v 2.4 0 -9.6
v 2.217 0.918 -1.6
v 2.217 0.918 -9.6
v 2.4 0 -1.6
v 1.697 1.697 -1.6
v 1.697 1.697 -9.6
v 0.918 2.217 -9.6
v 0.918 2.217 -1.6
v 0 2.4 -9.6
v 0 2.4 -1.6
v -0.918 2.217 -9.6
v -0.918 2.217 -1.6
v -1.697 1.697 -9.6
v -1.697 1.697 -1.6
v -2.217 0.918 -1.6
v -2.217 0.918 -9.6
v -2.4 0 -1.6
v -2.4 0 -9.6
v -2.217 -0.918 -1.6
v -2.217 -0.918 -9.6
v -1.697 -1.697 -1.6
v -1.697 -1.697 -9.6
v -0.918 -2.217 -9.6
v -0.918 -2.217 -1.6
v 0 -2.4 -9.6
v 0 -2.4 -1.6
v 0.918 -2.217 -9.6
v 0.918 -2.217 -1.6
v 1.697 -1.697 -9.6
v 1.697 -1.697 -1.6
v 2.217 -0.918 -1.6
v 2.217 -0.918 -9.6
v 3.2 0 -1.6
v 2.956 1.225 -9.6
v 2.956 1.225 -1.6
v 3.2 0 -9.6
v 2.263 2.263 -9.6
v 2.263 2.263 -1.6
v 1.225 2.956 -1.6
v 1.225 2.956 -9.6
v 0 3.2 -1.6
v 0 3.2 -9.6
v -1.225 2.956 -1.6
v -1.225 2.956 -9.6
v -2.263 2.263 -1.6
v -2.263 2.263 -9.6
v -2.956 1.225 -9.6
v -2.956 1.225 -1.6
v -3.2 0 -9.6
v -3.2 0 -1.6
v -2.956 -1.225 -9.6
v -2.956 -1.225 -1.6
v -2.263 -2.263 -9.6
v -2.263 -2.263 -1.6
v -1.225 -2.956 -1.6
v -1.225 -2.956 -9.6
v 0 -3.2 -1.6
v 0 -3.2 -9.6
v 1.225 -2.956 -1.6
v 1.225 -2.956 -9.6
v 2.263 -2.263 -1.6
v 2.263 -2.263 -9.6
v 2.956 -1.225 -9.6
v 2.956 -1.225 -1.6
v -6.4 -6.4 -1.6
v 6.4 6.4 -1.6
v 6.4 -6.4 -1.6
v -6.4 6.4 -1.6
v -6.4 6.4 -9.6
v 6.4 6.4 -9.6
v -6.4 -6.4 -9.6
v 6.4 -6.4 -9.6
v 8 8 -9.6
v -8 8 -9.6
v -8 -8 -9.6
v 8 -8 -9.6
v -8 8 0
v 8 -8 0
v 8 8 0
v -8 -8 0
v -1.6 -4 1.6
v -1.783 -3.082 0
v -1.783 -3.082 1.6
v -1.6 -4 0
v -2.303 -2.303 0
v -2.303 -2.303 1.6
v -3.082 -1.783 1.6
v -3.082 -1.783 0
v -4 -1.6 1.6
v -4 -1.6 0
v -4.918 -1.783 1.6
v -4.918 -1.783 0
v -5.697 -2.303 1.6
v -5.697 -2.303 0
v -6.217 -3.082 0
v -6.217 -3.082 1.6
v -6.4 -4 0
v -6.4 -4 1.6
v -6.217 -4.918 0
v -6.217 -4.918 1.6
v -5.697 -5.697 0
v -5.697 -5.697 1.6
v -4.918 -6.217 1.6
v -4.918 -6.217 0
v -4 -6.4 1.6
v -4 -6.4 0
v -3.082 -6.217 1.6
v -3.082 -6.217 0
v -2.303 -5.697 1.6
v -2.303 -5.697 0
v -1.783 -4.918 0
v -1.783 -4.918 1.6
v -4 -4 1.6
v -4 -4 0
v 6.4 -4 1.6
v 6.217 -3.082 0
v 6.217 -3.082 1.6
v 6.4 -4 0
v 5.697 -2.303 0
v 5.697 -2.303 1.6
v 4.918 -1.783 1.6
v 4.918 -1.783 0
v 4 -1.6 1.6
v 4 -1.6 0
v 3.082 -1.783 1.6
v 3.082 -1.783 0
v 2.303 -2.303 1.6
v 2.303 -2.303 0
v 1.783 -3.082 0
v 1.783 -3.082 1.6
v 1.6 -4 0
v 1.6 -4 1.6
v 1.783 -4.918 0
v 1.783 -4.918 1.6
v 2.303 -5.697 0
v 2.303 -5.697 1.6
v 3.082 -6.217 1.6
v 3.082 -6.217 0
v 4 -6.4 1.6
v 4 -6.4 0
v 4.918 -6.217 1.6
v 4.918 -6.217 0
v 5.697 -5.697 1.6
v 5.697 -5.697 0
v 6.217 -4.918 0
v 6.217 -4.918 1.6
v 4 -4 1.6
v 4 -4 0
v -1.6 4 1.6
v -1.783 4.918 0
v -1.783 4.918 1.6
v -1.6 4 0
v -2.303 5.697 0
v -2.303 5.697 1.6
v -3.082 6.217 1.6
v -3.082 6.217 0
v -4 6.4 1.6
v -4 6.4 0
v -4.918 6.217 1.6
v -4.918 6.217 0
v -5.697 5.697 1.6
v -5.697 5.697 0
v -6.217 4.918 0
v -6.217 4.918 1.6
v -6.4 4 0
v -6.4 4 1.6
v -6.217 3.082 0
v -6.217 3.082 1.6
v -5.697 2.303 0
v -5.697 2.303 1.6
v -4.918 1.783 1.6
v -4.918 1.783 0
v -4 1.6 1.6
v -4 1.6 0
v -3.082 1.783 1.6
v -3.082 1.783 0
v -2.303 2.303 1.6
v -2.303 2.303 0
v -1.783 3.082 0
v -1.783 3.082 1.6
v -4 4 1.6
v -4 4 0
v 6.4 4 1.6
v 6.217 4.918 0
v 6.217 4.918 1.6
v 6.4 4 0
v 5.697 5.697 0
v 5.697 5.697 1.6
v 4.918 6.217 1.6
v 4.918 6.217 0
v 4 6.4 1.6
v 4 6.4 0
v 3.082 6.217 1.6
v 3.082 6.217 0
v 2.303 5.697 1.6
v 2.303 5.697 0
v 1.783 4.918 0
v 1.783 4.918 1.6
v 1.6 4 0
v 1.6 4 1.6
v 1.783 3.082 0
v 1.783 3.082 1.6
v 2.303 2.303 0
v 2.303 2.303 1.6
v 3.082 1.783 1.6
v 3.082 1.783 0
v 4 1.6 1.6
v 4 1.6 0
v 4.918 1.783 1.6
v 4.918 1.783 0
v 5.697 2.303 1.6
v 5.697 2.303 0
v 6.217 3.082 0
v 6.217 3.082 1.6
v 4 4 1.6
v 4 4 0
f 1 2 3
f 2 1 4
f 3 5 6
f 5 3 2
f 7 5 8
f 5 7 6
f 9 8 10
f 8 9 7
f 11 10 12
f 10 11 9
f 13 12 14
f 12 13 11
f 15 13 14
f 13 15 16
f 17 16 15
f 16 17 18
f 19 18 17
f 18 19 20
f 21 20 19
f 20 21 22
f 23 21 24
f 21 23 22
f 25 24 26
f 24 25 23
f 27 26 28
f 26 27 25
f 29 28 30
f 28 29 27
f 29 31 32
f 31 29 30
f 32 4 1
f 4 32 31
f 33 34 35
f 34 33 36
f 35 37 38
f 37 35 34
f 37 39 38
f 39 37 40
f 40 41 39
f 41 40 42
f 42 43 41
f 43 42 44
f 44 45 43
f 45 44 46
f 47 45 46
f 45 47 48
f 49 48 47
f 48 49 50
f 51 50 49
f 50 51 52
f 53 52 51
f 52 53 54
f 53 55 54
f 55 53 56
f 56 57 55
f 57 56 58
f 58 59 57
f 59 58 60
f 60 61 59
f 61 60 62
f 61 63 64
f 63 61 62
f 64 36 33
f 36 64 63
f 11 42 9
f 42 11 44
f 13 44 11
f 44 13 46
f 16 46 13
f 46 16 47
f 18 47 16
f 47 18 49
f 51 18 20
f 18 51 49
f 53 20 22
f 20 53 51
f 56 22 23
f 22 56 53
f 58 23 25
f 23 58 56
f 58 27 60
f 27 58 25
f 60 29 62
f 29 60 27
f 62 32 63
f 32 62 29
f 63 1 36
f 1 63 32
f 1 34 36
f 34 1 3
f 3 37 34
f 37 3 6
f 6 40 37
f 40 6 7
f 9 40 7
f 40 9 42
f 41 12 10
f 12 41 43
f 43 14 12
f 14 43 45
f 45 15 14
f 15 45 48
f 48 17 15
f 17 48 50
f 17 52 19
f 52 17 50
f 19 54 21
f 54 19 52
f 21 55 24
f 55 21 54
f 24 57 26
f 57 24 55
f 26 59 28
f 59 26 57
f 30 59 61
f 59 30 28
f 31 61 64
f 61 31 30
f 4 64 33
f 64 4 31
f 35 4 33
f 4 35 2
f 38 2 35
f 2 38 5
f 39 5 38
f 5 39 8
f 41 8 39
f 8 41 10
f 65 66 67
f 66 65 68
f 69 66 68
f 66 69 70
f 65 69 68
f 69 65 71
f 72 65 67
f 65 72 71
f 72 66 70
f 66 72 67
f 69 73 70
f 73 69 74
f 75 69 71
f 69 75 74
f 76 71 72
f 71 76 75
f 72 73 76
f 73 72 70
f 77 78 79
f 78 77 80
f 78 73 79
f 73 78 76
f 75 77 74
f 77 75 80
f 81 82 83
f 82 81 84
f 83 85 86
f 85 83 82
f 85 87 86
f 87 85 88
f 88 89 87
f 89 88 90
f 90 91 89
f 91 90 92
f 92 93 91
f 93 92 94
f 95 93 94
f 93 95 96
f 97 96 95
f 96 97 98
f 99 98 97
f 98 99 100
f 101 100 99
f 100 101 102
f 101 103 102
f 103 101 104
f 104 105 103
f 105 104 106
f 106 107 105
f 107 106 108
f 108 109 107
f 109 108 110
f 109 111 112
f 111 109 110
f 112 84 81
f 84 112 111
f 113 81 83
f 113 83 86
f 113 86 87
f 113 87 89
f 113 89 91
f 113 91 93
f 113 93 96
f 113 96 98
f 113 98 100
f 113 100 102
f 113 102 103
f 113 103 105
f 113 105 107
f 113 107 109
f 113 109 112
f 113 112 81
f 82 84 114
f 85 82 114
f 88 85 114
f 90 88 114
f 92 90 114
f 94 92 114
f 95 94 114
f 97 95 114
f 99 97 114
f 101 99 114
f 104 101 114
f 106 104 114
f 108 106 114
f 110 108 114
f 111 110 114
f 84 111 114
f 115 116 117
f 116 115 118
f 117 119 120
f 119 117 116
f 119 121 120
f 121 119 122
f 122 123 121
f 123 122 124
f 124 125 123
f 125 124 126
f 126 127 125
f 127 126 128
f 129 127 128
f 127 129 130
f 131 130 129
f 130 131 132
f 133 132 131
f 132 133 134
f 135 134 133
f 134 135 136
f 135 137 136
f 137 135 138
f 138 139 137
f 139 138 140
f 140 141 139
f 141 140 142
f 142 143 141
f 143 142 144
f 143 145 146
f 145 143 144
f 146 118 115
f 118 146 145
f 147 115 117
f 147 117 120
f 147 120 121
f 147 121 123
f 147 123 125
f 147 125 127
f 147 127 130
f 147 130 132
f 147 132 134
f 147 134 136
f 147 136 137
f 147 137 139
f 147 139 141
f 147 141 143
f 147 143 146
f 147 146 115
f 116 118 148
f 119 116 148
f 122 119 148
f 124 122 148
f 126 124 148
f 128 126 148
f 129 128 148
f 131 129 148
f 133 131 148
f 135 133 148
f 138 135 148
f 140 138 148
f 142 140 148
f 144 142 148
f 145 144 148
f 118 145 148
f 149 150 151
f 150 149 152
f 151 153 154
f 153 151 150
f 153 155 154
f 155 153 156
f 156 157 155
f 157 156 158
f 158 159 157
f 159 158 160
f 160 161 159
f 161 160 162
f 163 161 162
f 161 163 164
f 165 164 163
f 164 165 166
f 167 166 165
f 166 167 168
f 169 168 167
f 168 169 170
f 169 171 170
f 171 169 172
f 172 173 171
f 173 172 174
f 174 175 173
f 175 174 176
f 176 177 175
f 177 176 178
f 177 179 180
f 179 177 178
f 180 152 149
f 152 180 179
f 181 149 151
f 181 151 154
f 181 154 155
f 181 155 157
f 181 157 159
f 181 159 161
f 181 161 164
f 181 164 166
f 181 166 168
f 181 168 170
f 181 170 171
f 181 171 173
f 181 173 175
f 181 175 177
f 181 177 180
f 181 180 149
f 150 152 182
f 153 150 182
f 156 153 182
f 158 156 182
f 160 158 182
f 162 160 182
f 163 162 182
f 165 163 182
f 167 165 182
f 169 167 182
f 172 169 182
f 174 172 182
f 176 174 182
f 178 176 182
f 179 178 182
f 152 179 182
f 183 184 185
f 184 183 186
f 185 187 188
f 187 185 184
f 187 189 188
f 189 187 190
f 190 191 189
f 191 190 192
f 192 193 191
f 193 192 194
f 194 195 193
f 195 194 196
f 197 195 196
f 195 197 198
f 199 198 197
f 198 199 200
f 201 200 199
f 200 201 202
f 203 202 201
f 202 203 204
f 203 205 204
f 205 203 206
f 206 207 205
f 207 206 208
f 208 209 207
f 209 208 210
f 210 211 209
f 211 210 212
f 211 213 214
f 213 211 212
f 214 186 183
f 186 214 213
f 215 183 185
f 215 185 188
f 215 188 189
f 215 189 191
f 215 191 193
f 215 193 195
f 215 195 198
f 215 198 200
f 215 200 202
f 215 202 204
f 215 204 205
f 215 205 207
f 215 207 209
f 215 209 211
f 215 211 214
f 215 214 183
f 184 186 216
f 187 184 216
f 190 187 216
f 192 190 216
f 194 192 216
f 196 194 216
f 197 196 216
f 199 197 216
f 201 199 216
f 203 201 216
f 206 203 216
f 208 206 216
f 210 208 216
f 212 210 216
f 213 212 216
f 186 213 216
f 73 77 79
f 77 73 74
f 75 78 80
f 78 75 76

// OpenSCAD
// file: ../p/4-4disc.scad
use <../lib.scad>
function ldraw_lib__4_4disc() = [
// 0 Disc 1.0
// 0 Name: 4-4disc.dat
// 0 Author: James Jessiman
// 0 !LDRAW_ORG Primitive UPDATE 2002-02
// 0 !LICENSE Licensed under CC BY 2.0 and CC BY 4.0 : see CAreadme.txt
// 
// 0 BFC CERTIFY CCW
  [0,"BFC","CERTIFY"],
  [0,"BFC","CCW"],
// 
// 0 !HISTORY 1998-12-15 [PTadmin] Official Update 1998-10
// 0 !HISTORY 2002-03-23 [sbliss] Added BFC statement
// 0 !HISTORY 2002-04-25 [PTadmin] Official Update 2002-02
// 0 !HISTORY 2007-06-24 [PTadmin] Header formatted for Contributor Agreement
// 0 !HISTORY 2008-07-01 [PTadmin] Official Update 2008-01
// 
// 
// 3 16 0 0 0 1 0 0 0.9239 0 0.3827
  [3,16,0,0,0,1,0,0,0.9239,0,0.3827],
// 3 16 0 0 0 0.9239 0 0.3827 0.7071 0 0.7071
  [3,16,0,0,0,0.9239,0,0.3827,0.7071,0,0.7071],
// 3 16 0 0 0 0.7071 0 0.7071 0.3827 0 0.9239
  [3,16,0,0,0,0.7071,0,0.7071,0.3827,0,0.9239],
// 3 16 0 0 0 0.3827 0 0.9239 0 0 1
  [3,16,0,0,0,0.3827,0,0.9239,0,0,1],
// 3 16 0 0 0 0 0 1 -0.3827 0 0.9239
  [3,16,0,0,0,0,0,1,-0.3827,0,0.9239],
// 3 16 0 0 0 -0.3827 0 0.9239 -0.7071 0 0.7071
  [3,16,0,0,0,-0.3827,0,0.9239,-0.7071,0,0.7071],
// 3 16 0 0 0 -0.7071 0 0.7071 -0.9239 0 0.3827
  [3,16,0,0,0,-0.7071,0,0.7071,-0.9239,0,0.3827],
// 3 16 0 0 0 -0.9239 0 0.3827 -1 0 -0
  [3,16,0,0,0,-0.9239,0,0.3827,-1,0,-0],
// 3 16 0 0 0 -1 0 -0 -0.9239 0 -0.3827
  [3,16,0,0,0,-1,0,-0,-0.9239,0,-0.3827],
// 3 16 0 0 0 -0.9239 0 -0.3827 -0.7071 0 -0.7071
  [3,16,0,0,0,-0.9239,0,-0.3827,-0.7071,0,-0.7071],
// 3 16 0 0 0 -0.7071 0 -0.7071 -0.3827 0 -0.9239
  [3,16,0,0,0,-0.7071,0,-0.7071,-0.3827,0,-0.9239],
// 3 16 0 0 0 -0.3827 0 -0.9239 0 0 -1
  [3,16,0,0,0,-0.3827,0,-0.9239,0,0,-1],
// 3 16 0 0 0 0 0 -1 0.3827 0 -0.9239
  [3,16,0,0,0,0,0,-1,0.3827,0,-0.9239],
// 3 16 0 0 0 0.3827 0 -0.9239 0.7071 0 -0.7071
  [3,16,0,0,0,0.3827,0,-0.9239,0.7071,0,-0.7071],
// 3 16 0 0 0 0.7071 0 -0.7071 0.9239 0 -0.3827
  [3,16,0,0,0,0.7071,0,-0.7071,0.9239,0,-0.3827],
// 3 16 0 0 0 0.9239 0 -0.3827 1 0 0
  [3,16,0,0,0,0.9239,0,-0.3827,1,0,0],
// 0
];
module ldraw_lib__4_4disc(step=0, col=false, unit=2/5, alt=false, line=0.2, solid=!$preview)
    makepoly(ldraw_lib__4_4disc(), step=step, col=col, unit=unit, alt=alt, line=line, solid=solid);
ldraw_lib__4_4disc(line=0.2);
// file: ../p/stud.scad
use <../lib.scad>
use <4-4cyli.scad>
use <4-4disc.scad>
use <4-4edge.scad>
function ldraw_lib__stud() = [
// 0 Stud
// 0 Name: stud.dat
// 0 Author: James Jessiman
// 0 !LDRAW_ORG Primitive UPDATE 2012-01
// 0 !LICENSE Licensed under CC BY 4.0 : see CAreadme.txt
// 
// 0 BFC CERTIFY CCW
  [0,"BFC","CERTIFY"],
  [0,"BFC","CCW"],
// 
// 0 !HISTORY 2002-04-04 [sbliss] Modified for BFC compliance
// 0 !HISTORY 2002-04-25 [PTadmin] Official Update 2002-02
// 0 !HISTORY 2007-06-24 [PTadmin] Header formatted for Contributor Agreement
// 0 !HISTORY 2008-07-01 [PTadmin] Official Update 2008-01
// 0 !HISTORY 2012-02-16 [Philo] Changed to CCW
// 0 !HISTORY 2012-03-30 [PTadmin] Official Update 2012-01
// 
// 
// 1 16 0 0 0 6 0 0 0 1 0 0 0 6 4-4edge.dat
  [1,16,0,0,0,6,0,0,0,1,0,0,0,6, ldraw_lib__4_4edge()],
// 1 16 0 -4 0 6 0 0 0 1 0 0 0 6 4-4edge.dat
  [1,16,0,-4,0,6,0,0,0,1,0,0,0,6, ldraw_lib__4_4edge()],
// 1 16 0 0 0 6 0 0 0 -4 0 0 0 6 4-4cyli.dat
  [1,16,0,0,0,6,0,0,0,-4,0,0,0,6, ldraw_lib__4_4cyli()],
// 1 16 0 -4 0 6 0 0 0 1 0 0 0 6 4-4disc.dat
  [1,16,0,-4,0,6,0,0,0,1,0,0,0,6, ldraw_lib__4_4disc()],
  [-1,16,0,0,0,6,0,0,0,-1,0,0,0,6, ldraw_lib__4_4disc()],
];
module ldraw_lib__stud(step=0, col=false, unit=2/5, alt=false, line=0.2, solid=!$preview)
    makepoly(ldraw_lib__stud(), step=step, col=col, unit=unit, alt=alt, line=line, solid=solid);
ldraw_lib__stud(line=0.2);
// file: ../p/4-4ring3.scad
use <../lib.scad>
$fa=1; $fs=0.2;
function ldraw_lib__4_4ring3(realsolid=false) = [
// 0 Ring  3 x 1.0
// 0 Name: 4-4ring3.dat
// 0 Author: James Jessiman
// 0 !LDRAW_ORG Primitive UPDATE 2009-01
// 0 !LICENSE Licensed under CC BY 2.0 and CC BY 4.0 : see CAreadme.txt
// 
// 0 BFC CERTIFY CCW
  [0,"BFC","CERTIFY"],
  [0,"BFC","CCW"],
// 
// 0 !HISTORY 1998-12-15 [PTadmin] Official Update 1998-10
// 0 !HISTORY 2002-04-05 [hafhead] Added BFC statement
// 0 !HISTORY 2002-04-25 [PTadmin] Official Update 2002-02
// 0 !HISTORY 2007-06-24 [PTadmin] Header formatted for Contributor Agreement
// 0 !HISTORY 2008-07-01 [PTadmin] Official Update 2008-01
// 0 !HISTORY 2008-08-26 [cwdee] Switch polygon winding and rename
// 0 !HISTORY 2009-05-02 [PTadmin] Official Update 2009-01
// 
// 
// 4 16 -1.5308 0 3.6956 -1.1481 0 2.7717 0 0 3 0 0 4
  [4,16,-1.5308,0,3.6956,-1.1481,0,2.7717,0,0,3,0,0,4],
// 4 16 -2.8284 0 2.8284 -2.1213 0 2.1213 -1.1481 0 2.7717 -1.5308 0 3.6956
  [4,16,-2.8284,0,2.8284,-2.1213,0,2.1213,-1.1481,0,2.7717,-1.5308,0,3.6956],
// 4 16 -3.6956 0 1.5308 -2.7717 0 1.1481 -2.1213 0 2.1213 -2.8284 0 2.8284
  [4,16,-3.6956,0,1.5308,-2.7717,0,1.1481,-2.1213,0,2.1213,-2.8284,0,2.8284],
// 4 16 -4 0 0 -3 0 0 -2.7717 0 1.1481 -3.6956 0 1.5308
  [4,16,-4,0,0,-3,0,0,-2.7717,0,1.1481,-3.6956,0,1.5308],
// 4 16 -3.6956 0 -1.5308 -2.7717 0 -1.1481 -3 0 0 -4 0 0
  [4,16,-3.6956,0,-1.5308,-2.7717,0,-1.1481,-3,0,0,-4,0,0],
// 4 16 -2.8284 0 -2.8284 -2.1213 0 -2.1213 -2.7717 0 -1.1481 -3.6956 0 -1.5308
  [4,16,-2.8284,0,-2.8284,-2.1213,0,-2.1213,-2.7717,0,-1.1481,-3.6956,0,-1.5308],
// 4 16 -1.5308 0 -3.6956 -1.1481 0 -2.7717 -2.1213 0 -2.1213 -2.8284 0 -2.8284
  [4,16,-1.5308,0,-3.6956,-1.1481,0,-2.7717,-2.1213,0,-2.1213,-2.8284,0,-2.8284],
// 4 16 0 0 -4 0 0 -3 -1.1481 0 -2.7717 -1.5308 0 -3.6956
  [4,16,0,0,-4,0,0,-3,-1.1481,0,-2.7717,-1.5308,0,-3.6956],
// 4 16 1.5308 0 -3.6956 1.1481 0 -2.7717 0 0 -3 0 0 -4
  [4,16,1.5308,0,-3.6956,1.1481,0,-2.7717,0,0,-3,0,0,-4],
// 4 16 2.8284 0 -2.8284 2.1213 0 -2.1213 1.1481 0 -2.7717 1.5308 0 -3.6956
  [4,16,2.8284,0,-2.8284,2.1213,0,-2.1213,1.1481,0,-2.7717,1.5308,0,-3.6956],
// 4 16 3.6956 0 -1.5308 2.7717 0 -1.1481 2.1213 0 -2.1213 2.8284 0 -2.8284
  [4,16,3.6956,0,-1.5308,2.7717,0,-1.1481,2.1213,0,-2.1213,2.8284,0,-2.8284],
// 4 16 4 0 0 3 0 0 2.7717 0 -1.1481 3.6956 0 -1.5308
  [4,16,4,0,0,3,0,0,2.7717,0,-1.1481,3.6956,0,-1.5308],
// 4 16 3.6956 0 1.5308 2.7717 0 1.1481 3 0 0 4 0 0
  [4,16,3.6956,0,1.5308,2.7717,0,1.1481,3,0,0,4,0,0],
// 4 16 2.8284 0 2.8284 2.1213 0 2.1213 2.7717 0 1.1481 3.6956 0 1.5308
  [4,16,2.8284,0,2.8284,2.1213,0,2.1213,2.7717,0,1.1481,3.6956,0,1.5308],
// 4 16 1.5308 0 3.6956 1.1481 0 2.7717 2.1213 0 2.1213 2.8284 0 2.8284
  [4,16,1.5308,0,3.6956,1.1481,0,2.7717,2.1213,0,2.1213,2.8284,0,2.8284],
// 4 16 0 0 4 0 0 3 1.1481 0 2.7717 1.5308 0 3.6956
  [4,16,0,0,4,0,0,3,1.1481,0,2.7717,1.5308,0,3.6956],
// 0
];
module ldraw_lib__4_4ring3(step=0, col=false, unit=2/5, alt=false, line=0.2, solid=!$preview)
    makepoly(ldraw_lib__4_4ring3(solid), step=step, col=col, unit=unit, alt=alt, line=line, solid=solid);
ldraw_lib__4_4ring3(line=0.2);
// file: ../p/4-4edge.scad
use <../lib.scad>
function ldraw_lib__4_4edge() = [
// 0 Circle 1.0
// 0 Name: 4-4edge.dat
// 0 Author: James Jessiman
// 0 !LDRAW_ORG Primitive UPDATE 2017-01
// 0 !LICENSE Licensed under CC BY 2.0 and CC BY 4.0 : see CAreadme.txt
// 
// 0 BFC CERTIFY CCW
  [0,"BFC","CERTIFY"],
  [0,"BFC","CCW"],
// 
// 0 !HISTORY 1998-12-15 [PTadmin] Official Update 1998-10
// 0 !HISTORY 2005-12-28 [PTadmin] Official Update 2005-01
// 0 !HISTORY 2007-06-24 [PTadmin] Header formatted for Contributor Agreement
// 0 !HISTORY 2008-07-01 [PTadmin] Official Update 2008-01
// 0 !HISTORY 2017-01-15 [Steffen] BFCed
// 0 !HISTORY 2017-12-30 [PTadmin] Official Update 2017-01
// 
// 
// 2 24 1 0 0 0.9239 0 0.3827
  [2,24,1,0,0,0.9239,0,0.3827],
// 2 24 0.9239 0 0.3827 0.7071 0 0.7071
  [2,24,0.9239,0,0.3827,0.7071,0,0.7071],
// 2 24 0.7071 0 0.7071 0.3827 0 0.9239
  [2,24,0.7071,0,0.7071,0.3827,0,0.9239],
// 2 24 0.3827 0 0.9239 0 0 1
  [2,24,0.3827,0,0.9239,0,0,1],
// 2 24 0 0 1 -0.3827 0 0.9239
  [2,24,0,0,1,-0.3827,0,0.9239],
// 2 24 -0.3827 0 0.9239 -0.7071 0 0.7071
  [2,24,-0.3827,0,0.9239,-0.7071,0,0.7071],
// 2 24 -0.7071 0 0.7071 -0.9239 0 0.3827
  [2,24,-0.7071,0,0.7071,-0.9239,0,0.3827],
// 2 24 -0.9239 0 0.3827 -1 0 -0
  [2,24,-0.9239,0,0.3827,-1,0,-0],
// 2 24 -1 0 -0 -0.9239 0 -0.3827
  [2,24,-1,0,-0,-0.9239,0,-0.3827],
// 2 24 -0.9239 0 -0.3827 -0.7071 0 -0.7071
  [2,24,-0.9239,0,-0.3827,-0.7071,0,-0.7071],
// 2 24 -0.7071 0 -0.7071 -0.3827 0 -0.9239
  [2,24,-0.7071,0,-0.7071,-0.3827,0,-0.9239],
// 2 24 -0.3827 0 -0.9239 0 0 -1
  [2,24,-0.3827,0,-0.9239,0,0,-1],
// 2 24 0 0 -1 0.3827 0 -0.9239
  [2,24,0,0,-1,0.3827,0,-0.9239],
// 2 24 0.3827 0 -0.9239 0.7071 0 -0.7071
  [2,24,0.3827,0,-0.9239,0.7071,0,-0.7071],
// 2 24 0.7071 0 -0.7071 0.9239 0 -0.3827
  [2,24,0.7071,0,-0.7071,0.9239,0,-0.3827],
// 2 24 0.9239 0 -0.3827 1 0 0
  [2,24,0.9239,0,-0.3827,1,0,0],
];
module ldraw_lib__4_4edge(step=0, col=false, unit=2/5, alt=false, line=0.2, solid=!$preview)
    makepoly(ldraw_lib__4_4edge(), step=step, col=col, unit=unit, alt=alt, line=line, solid=solid);
ldraw_lib__4_4edge(line=0.2);
// file: ../p/4-4cyli.scad
use <../lib.scad>
$fa=1; $fs=0.2;
function ldraw_lib__4_4cyli(realsolid=false) = [
// 0 Cylinder 1.0
// 0 Name: 4-4cyli.dat
// 0 Author: James Jessiman
// 0 !LDRAW_ORG Primitive UPDATE 2005-01
// 0 !LICENSE Licensed under CC BY 2.0 and CC BY 4.0 : see CAreadme.txt
// 
// 0 BFC CERTIFY CCW
  [0,"BFC","CERTIFY"],
  [0,"BFC","CCW"],
// 
// 0 !HISTORY 1998-12-15 [PTadmin] Official Update 1998-10
// 0 !HISTORY 2002-03-23 [sbliss] Added BFC statement; merged headers from files in distributions LDraw 0.27 and Complete.
// 0 !HISTORY 2002-04-25 [PTadmin] Official Update 2002-02
// 0 !HISTORY 2004-12-14 [guyvivan] BFC CCW
// 0 !HISTORY 2005-12-28 [PTadmin] Official Update 2005-01
// 0 !HISTORY 2007-06-24 [PTadmin] Header formatted for Contributor Agreement
// 0 !HISTORY 2008-07-01 [PTadmin] Official Update 2008-01
// 
// 
// 4 16 1 1 0 0.9239 1 0.3827 0.9239 0 0.3827 1 0 0
  [4,16,1,1,0,0.9239,1,0.3827,0.9239,0,0.3827,1,0,0],
// 5 24 1 0 0 1 1 0 0.9239 0 0.3827 0.9239 0 -0.3827
  [5,24,1,0,0,1,1,0,0.9239,0,0.3827,0.9239,0,-0.3827],
// 4 16 0.9239 1 0.3827 0.7071 1 0.7071 0.7071 0 0.7071 0.9239 0 0.3827
  [4,16,0.9239,1,0.3827,0.7071,1,0.7071,0.7071,0,0.7071,0.9239,0,0.3827],
// 5 24 0.9239 0 0.3827 0.9239 1 0.3827 0.7071 0 0.7071 1 0 0
  [5,24,0.9239,0,0.3827,0.9239,1,0.3827,0.7071,0,0.7071,1,0,0],
// 4 16 0.7071 1 0.7071 0.3827 1 0.9239 0.3827 0 0.9239 0.7071 0 0.7071
  [4,16,0.7071,1,0.7071,0.3827,1,0.9239,0.3827,0,0.9239,0.7071,0,0.7071],
// 5 24 0.7071 0 0.7071 0.7071 1 0.7071 0.3827 0 0.9239 0.9239 0 0.3827
  [5,24,0.7071,0,0.7071,0.7071,1,0.7071,0.3827,0,0.9239,0.9239,0,0.3827],
// 4 16 0.3827 1 0.9239 0 1 1 0 0 1 0.3827 0 0.9239
  [4,16,0.3827,1,0.9239,0,1,1,0,0,1,0.3827,0,0.9239],
// 5 24 0.3827 0 0.9239 0.3827 1 0.9239 0 0 1 0.7071 0 0.7071
  [5,24,0.3827,0,0.9239,0.3827,1,0.9239,0,0,1,0.7071,0,0.7071],
// 4 16 0 1 1 -0.3827 1 0.9239 -0.3827 0 0.9239 0 0 1
  [4,16,0,1,1,-0.3827,1,0.9239,-0.3827,0,0.9239,0,0,1],
// 5 24 0 0 1 0 1 1 -0.3827 0 0.9239 0.3827 0 0.9239
  [5,24,0,0,1,0,1,1,-0.3827,0,0.9239,0.3827,0,0.9239],
// 4 16 -0.3827 1 0.9239 -0.7071 1 0.7071 -0.7071 0 0.7071 -0.3827 0 0.9239
  [4,16,-0.3827,1,0.9239,-0.7071,1,0.7071,-0.7071,0,0.7071,-0.3827,0,0.9239],
// 5 24 -0.3827 0 0.9239 -0.3827 1 0.9239 -0.7071 0 0.7071 0 0 1
  [5,24,-0.3827,0,0.9239,-0.3827,1,0.9239,-0.7071,0,0.7071,0,0,1],
// 4 16 -0.7071 1 0.7071 -0.9239 1 0.3827 -0.9239 0 0.3827 -0.7071 0 0.7071
  [4,16,-0.7071,1,0.7071,-0.9239,1,0.3827,-0.9239,0,0.3827,-0.7071,0,0.7071],
// 5 24 -0.7071 0 0.7071 -0.7071 1 0.7071 -0.9239 0 0.3827 -0.3827 0 0.9239
  [5,24,-0.7071,0,0.7071,-0.7071,1,0.7071,-0.9239,0,0.3827,-0.3827,0,0.9239],
// 4 16 -0.9239 1 0.3827 -1 1 0 -1 0 0 -0.9239 0 0.3827
  [4,16,-0.9239,1,0.3827,-1,1,0,-1,0,0,-0.9239,0,0.3827],
// 5 24 -0.9239 0 0.3827 -0.9239 1 0.3827 -1 0 0 -0.7071 0 0.7071
  [5,24,-0.9239,0,0.3827,-0.9239,1,0.3827,-1,0,0,-0.7071,0,0.7071],
// 4 16 -1 1 0 -0.9239 1 -0.3827 -0.9239 0 -0.3827 -1 0 0
  [4,16,-1,1,0,-0.9239,1,-0.3827,-0.9239,0,-0.3827,-1,0,0],
// 5 24 -1 0 0 -1 1 0 -0.9239 0 -0.3827 -0.9239 0 0.3827
  [5,24,-1,0,0,-1,1,0,-0.9239,0,-0.3827,-0.9239,0,0.3827],
// 4 16 -0.9239 1 -0.3827 -0.7071 1 -0.7071 -0.7071 0 -0.7071 -0.9239 0 -0.3827
  [4,16,-0.9239,1,-0.3827,-0.7071,1,-0.7071,-0.7071,0,-0.7071,-0.9239,0,-0.3827],
// 5 24 -0.9239 0 -0.3827 -0.9239 1 -0.3827 -0.7071 0 -0.7071 -1 0 0
  [5,24,-0.9239,0,-0.3827,-0.9239,1,-0.3827,-0.7071,0,-0.7071,-1,0,0],
// 4 16 -0.7071 1 -0.7071 -0.3827 1 -0.9239 -0.3827 0 -0.9239 -0.7071 0 -0.7071
  [4,16,-0.7071,1,-0.7071,-0.3827,1,-0.9239,-0.3827,0,-0.9239,-0.7071,0,-0.7071],
// 5 24 -0.7071 0 -0.7071 -0.7071 1 -0.7071 -0.3827 0 -0.9239 -0.9239 0 -0.3827
  [5,24,-0.7071,0,-0.7071,-0.7071,1,-0.7071,-0.3827,0,-0.9239,-0.9239,0,-0.3827],
// 4 16 -0.3827 1 -0.9239 0 1 -1 0 0 -1 -0.3827 0 -0.9239
  [4,16,-0.3827,1,-0.9239,0,1,-1,0,0,-1,-0.3827,0,-0.9239],
// 5 24 -0.3827 0 -0.9239 -0.3827 1 -0.9239 0 0 -1 -0.7071 0 -0.7071
  [5,24,-0.3827,0,-0.9239,-0.3827,1,-0.9239,0,0,-1,-0.7071,0,-0.7071],
// 4 16 0 1 -1 0.3827 1 -0.9239 0.3827 0 -0.9239 0 0 -1
  [4,16,0,1,-1,0.3827,1,-0.9239,0.3827,0,-0.9239,0,0,-1],
// 5 24 0 0 -1 0 1 -1 0.3827 0 -0.9239 -0.3827 0 -0.9239
  [5,24,0,0,-1,0,1,-1,0.3827,0,-0.9239,-0.3827,0,-0.9239],
// 4 16 0.3827 1 -0.9239 0.7071 1 -0.7071 0.7071 0 -0.7071 0.3827 0 -0.9239
  [4,16,0.3827,1,-0.9239,0.7071,1,-0.7071,0.7071,0,-0.7071,0.3827,0,-0.9239],
// 5 24 0.3827 0 -0.9239 0.3827 1 -0.9239 0.7071 0 -0.7071 0 0 -1
  [5,24,0.3827,0,-0.9239,0.3827,1,-0.9239,0.7071,0,-0.7071,0,0,-1],
// 4 16 0.7071 1 -0.7071 0.9239 1 -0.3827 0.9239 0 -0.3827 0.7071 0 -0.7071
  [4,16,0.7071,1,-0.7071,0.9239,1,-0.3827,0.9239,0,-0.3827,0.7071,0,-0.7071],
// 5 24 0.7071 0 -0.7071 0.7071 1 -0.7071 0.9239 0 -0.3827 0.3827 0 -0.9239
  [5,24,0.7071,0,-0.7071,0.7071,1,-0.7071,0.9239,0,-0.3827,0.3827,0,-0.9239],
// 4 16 0.9239 1 -0.3827 1 1 0 1 0 0 0.9239 0 -0.3827
  [4,16,0.9239,1,-0.3827,1,1,0,1,0,0,0.9239,0,-0.3827],
// 5 24 0.9239 0 -0.3827 0.9239 1 -0.3827 1 0 0 0.7071 0 -0.7071
  [5,24,0.9239,0,-0.3827,0.9239,1,-0.3827,1,0,0,0.7071,0,-0.7071],
// 0
];
module ldraw_lib__4_4cyli(step=0, col=false, unit=2/5, alt=false, line=0.2, solid=!$preview)
    makepoly(ldraw_lib__4_4cyli(solid), step=step, col=col, unit=unit, alt=alt, line=line, solid=solid);
ldraw_lib__4_4cyli(line=0.2);
// file: ../p/stug-2x2.scad
use <../lib.scad>
use <stud.scad>
function ldraw_lib__stug_2x2() = [
// 0 Stud Group  2 x  2
// 0 Name: stug-2x2.dat
// 0 Author: Steffen [Steffen]
// 0 !LDRAW_ORG Primitive UPDATE 2012-01
// 0 !LICENSE Licensed under CC BY 2.0 and CC BY 4.0 : see CAreadme.txt
// 
// 0 BFC CERTIFY CCW
  [0,"BFC","CERTIFY"],
  [0,"BFC","CCW"],
// 
// 0 !HISTORY 2005-12-28 [PTadmin] Official Update 2005-01
// 0 !HISTORY 2007-05-04 [PTadmin] Header formatted for Contributor Agreement
// 0 !HISTORY 2008-07-01 [PTadmin] Official Update 2008-01
// 0 !HISTORY 2011-07-01 [PTadmin] Renamed from stug2
// 0 !HISTORY 2011-07-25 [PTadmin] Official Update 2011-01
// 0 !HISTORY 2012-02-16 [Philo] Changed to CCW
// 0 !HISTORY 2012-03-30 [PTadmin] Official Update 2012-01
// 
// 
// 1 16 -10 0 -10 1 0 0 0 1 0 0 0 1 stud.dat
  [1,16,-10,0,-10,1,0,0,0,1,0,0,0,1, ldraw_lib__stud()],
// 1 16 10 0 -10 1 0 0 0 1 0 0 0 1 stud.dat
  [1,16,10,0,-10,1,0,0,0,1,0,0,0,1, ldraw_lib__stud()],
// 1 16 -10 0 10 1 0 0 0 1 0 0 0 1 stud.dat
  [1,16,-10,0,10,1,0,0,0,1,0,0,0,1, ldraw_lib__stud()],
// 1 16 10 0 10 1 0 0 0 1 0 0 0 1 stud.dat
  [1,16,10,0,10,1,0,0,0,1,0,0,0,1, ldraw_lib__stud()],
];
module ldraw_lib__stug_2x2(step=0, col=false, unit=2/5, alt=false, line=0.2, solid=!$preview)
    makepoly(ldraw_lib__stug_2x2(), step=step, col=col, unit=unit, alt=alt, line=line, solid=solid);
ldraw_lib__stug_2x2(line=0.2);
// file: ../p/stud4.scad
use <../lib.scad>
use <4-4cyli.scad>
use <4-4edge.scad>
use <4-4ring3.scad>
function ldraw_lib__stud4() = [
// 0 Stud Tube Open
// 0 Name: stud4.dat
// 0 Author: James Jessiman
// 0 !LDRAW_ORG Primitive UPDATE 2009-02
// 0 !LICENSE Licensed under CC BY 4.0 : see CAreadme.txt
// 
// 0 BFC CERTIFY CCW
  [0,"BFC","CERTIFY"],
  [0,"BFC","CCW"],
// 
// 0 !HISTORY 1999-07-05 [PTadmin] Official Update 1999-05
// 0 !HISTORY 2002-04-04 [sbliss] Modified for BFC compliance
// 0 !HISTORY 2002-04-25 [PTadmin] Official Update 2002-02
// 0 !HISTORY 2007-06-24 [PTadmin] Header formatted for Contributor Agreement
// 0 !HISTORY 2008-07-01 [PTadmin] Official Update 2008-01
// 0 !HISTORY 2009-06-21 [cwdee] Update ring references to 4-4ring
// 0 !HISTORY 2009-09-03 [PTadmin] Official Update 2009-02
// 
// 
// 1 16 0 -4 0 6 0 0 0 1 0 0 0 6 4-4edge.dat
  [1,16,0,-4,0,6,0,0,0,1,0,0,0,6, ldraw_lib__4_4edge()],
// 1 16 0 -4 0 8 0 0 0 1 0 0 0 8 4-4edge.dat
  [1,16,0,-4,0,8,0,0,0,1,0,0,0,8, ldraw_lib__4_4edge()],
// 1 16 0 0 0 6 0 0 0 1 0 0 0 6 4-4edge.dat
  [1,16,0,0,0,6,0,0,0,1,0,0,0,6, ldraw_lib__4_4edge()],
// 1 16 0 0 0 8 0 0 0 1 0 0 0 8 4-4edge.dat
  [1,16,0,0,0,8,0,0,0,1,0,0,0,8, ldraw_lib__4_4edge()],
// 0 BFC INVERTNEXT
  [0,"BFC","INVERTNEXT"],
// 1 16 0 -4 0 6 0 0 0 4 0 0 0 6 4-4cyli.dat
  [1,16,0,-4,0,6,0,0,0,4,0,0,0,6, ldraw_lib__4_4cyli()],
// 1 16 0 -4 0 8 0 0 0 4 0 0 0 8 4-4cyli.dat
  [1,16,0,-4,0,8,0,0,0,4,0,0,0,8, ldraw_lib__4_4cyli()],
// 1 16 0 -4 0 2 0 0 0 1 0 0 0 2 4-4ring3.dat
  [1,16,0,-4,0,2,0,0,0,1,0,0,0,2, ldraw_lib__4_4ring3()],
  [-1,16,0,0,0,2,0,0,0,-1,0,0,0,2, ldraw_lib__4_4ring3()],
// 0
];
module ldraw_lib__stud4(step=0, col=false, unit=2/5, alt=false, line=0.2, solid=!$preview)
    makepoly(ldraw_lib__stud4(), step=step, col=col, unit=unit, alt=alt, line=line, solid=solid);
ldraw_lib__stud4(line=0.2);
// file: ../p/box5.scad
use <../lib.scad>
function ldraw_lib__box5() = [
// 0 Box with 5 Faces and All Edges
// 0 Name: box5.dat
// 0 Author: James Jessiman
// 0 !LDRAW_ORG Primitive UPDATE 2012-01
// 0 !LICENSE Licensed under CC BY 2.0 and CC BY 4.0 : see CAreadme.txt
// 
// 0 BFC CERTIFY CCW
  [0,"BFC","CERTIFY"],
  [0,"BFC","CCW"],
// 
// 0 !HISTORY 2002-04-03 [sbliss] Modified for BFC compliance
// 0 !HISTORY 2002-04-25 [PTadmin] Official Update 2002-02
// 0 !HISTORY 2007-06-24 [PTadmin] Header formatted for Contributor Agreement
// 0 !HISTORY 2008-07-01 [PTadmin] Official Update 2008-01
// 0 !HISTORY 2012-02-16 [Philo] Changed to CCW
// 0 !HISTORY 2012-03-30 [PTadmin] Official Update 2012-01
// 
// 
// 2 24 1 1 1 -1 1 1
  [2,24,1,1,1,-1,1,1],
// 2 24 -1 1 1 -1 1 -1
  [2,24,-1,1,1,-1,1,-1],
// 2 24 -1 1 -1 1 1 -1
  [2,24,-1,1,-1,1,1,-1],
// 2 24 1 1 -1 1 1 1
  [2,24,1,1,-1,1,1,1],
// 2 24 1 0 1 -1 0 1
  [2,24,1,0,1,-1,0,1],
// 2 24 -1 0 1 -1 0 -1
  [2,24,-1,0,1,-1,0,-1],
// 2 24 -1 0 -1 1 0 -1
  [2,24,-1,0,-1,1,0,-1],
// 2 24 1 0 -1 1 0 1
  [2,24,1,0,-1,1,0,1],
// 2 24 1 0 1 1 1 1
  [2,24,1,0,1,1,1,1],
// 2 24 -1 0 1 -1 1 1
  [2,24,-1,0,1,-1,1,1],
// 2 24 1 0 -1 1 1 -1
  [2,24,1,0,-1,1,1,-1],
// 2 24 -1 0 -1 -1 1 -1
  [2,24,-1,0,-1,-1,1,-1],
// 4 16 -1 1 1 1 1 1 1 1 -1 -1 1 -1
  [4,16,-1,1,1,1,1,1,1,1,-1,-1,1,-1],
// 4 16 -1 1 1 -1 0 1 1 0 1 1 1 1
  [4,16,-1,1,1,-1,0,1,1,0,1,1,1,1],
// 4 16 -1 1 -1 -1 0 -1 -1 0 1 -1 1 1
  [4,16,-1,1,-1,-1,0,-1,-1,0,1,-1,1,1],
// 4 16 1 1 -1 1 0 -1 -1 0 -1 -1 1 -1
  [4,16,1,1,-1,1,0,-1,-1,0,-1,-1,1,-1],
// 4 16 1 1 1 1 0 1 1 0 -1 1 1 -1
  [4,16,1,1,1,1,0,1,1,0,-1,1,1,-1],
];
makepoly(ldraw_lib__box5(), line=0.2);
// file: ../p/box3u2p.scad
use <../lib.scad>
function ldraw_lib__box3u2p() = [
// 0 Box with 3 Faces without 2 Parallel Edges
// 0 Name: box3u2p.dat
// 0 Author: Niels Karsdorp [nielsk]
// 0 !LDRAW_ORG Primitive UPDATE 2012-01
// 0 !LICENSE Licensed under CC BY 2.0 and CC BY 4.0 : see CAreadme.txt
// 
// 0 BFC CERTIFY CCW
  [0,"BFC","CERTIFY"],
  [0,"BFC","CCW"],
// 
// 0 !HISTORY 2003-03-12 [PTadmin] Official Update 2003-01
// 0 !HISTORY 2007-06-24 [PTadmin] Header formatted for Contributor Agreement
// 0 !HISTORY 2008-07-01 [PTadmin] Official Update 2008-01
// 0 !HISTORY 2012-02-16 [Philo] Changed to CCW
// 0 !HISTORY 2012-03-30 [PTadmin] Official Update 2012-01
// 
// 
// 2 24 1 1 1 -1 1 1
  [2,24,1,1,1,-1,1,1],
// 2 24 -1 1 -1 1 1 -1
  [2,24,-1,1,-1,1,1,-1],
// 2 24 1 0 1 -1 0 1
  [2,24,1,0,1,-1,0,1],
// 2 24 -1 0 -1 1 0 -1
  [2,24,-1,0,-1,1,0,-1],
// 2 24 1 1 1 1 1 -1
  [2,24,1,1,1,1,1,-1],
// 2 24 -1 1 1 -1 1 -1
  [2,24,-1,1,1,-1,1,-1],
// 2 24 1 1 1 1 0 1
  [2,24,1,1,1,1,0,1],
// 2 24 1 1 -1 1 0 -1
  [2,24,1,1,-1,1,0,-1],
// 2 24 -1 1 1 -1 0 1
  [2,24,-1,1,1,-1,0,1],
// 2 24 -1 1 -1 -1 0 -1
  [2,24,-1,1,-1,-1,0,-1],
// 4 16 -1 1 -1 -1 1 1 1 1 1 1 1 -1
  [4,16,-1,1,-1,-1,1,1,1,1,1,1,1,-1],
// 4 16 -1 1 1 -1 0 1 1 0 1 1 1 1
  [4,16,-1,1,1,-1,0,1,1,0,1,1,1,1],
// 4 16 1 1 -1 1 0 -1 -1 0 -1 -1 1 -1
  [4,16,1,1,-1,1,0,-1,-1,0,-1,-1,1,-1],
];
module ldraw_lib__box3u2p(step=0, col=false, unit=2/5, alt=false, line=0.2, solid=!$preview)
    makepoly(ldraw_lib__box3u2p(), step=step, col=col, unit=unit, alt=alt, line=line, solid=solid);
ldraw_lib__box3u2p(line=0.2);
// file: s/3003s02.scad
use <../../lib.scad>
use <../../p/box3u2p.scad>
use <../../p/box5.scad>
use <../../p/stud4.scad>
use <../../p/stug-2x2.scad>
function ldraw_lib__s__3003s02() = [
// 0 ~Brick  2 x  2 without Front and Back Faces
// 0 Name: s\3003s02.dat
// 0 Author: Owen Burgoyne [C3POwen]
// 0 !LDRAW_ORG Subpart UPDATE 2013-02
// 0 !LICENSE Licensed under CC BY 2.0 and CC BY 4.0 : see CAreadme.txt
// 
// 0 BFC CERTIFY CCW
  [0,"BFC","CERTIFY"],
  [0,"BFC","CCW"],
// 
// 0 !HISTORY 2013-12-23 [PTadmin] Official Update 2013-02
// 
// 
// 1 16 0 4 0 1 0 0 0 -5 0 0 0 1 stud4.dat
  [1,16,0,4,0,1,0,0,0,-5,0,0,0,1, ldraw_lib__stud4()],
// 0 BFC INVERTNEXT
  [0,"BFC","INVERTNEXT"],
// 1 16 0 24 0 16 0 0 0 -20 0 0 0 16 box5.dat
  [1,16,0,24,0,16,0,0,0,-20,0,0,0,16, ldraw_lib__box5()],
// 4 16 20 24 20 16 24 16 -16 24 16 -20 24 20
  [4,16,20,24,20,16,24,16,-16,24,16,-20,24,20],
// 4 16 -20 24 20 -16 24 16 -16 24 -16 -20 24 -20
  [4,16,-20,24,20,-16,24,16,-16,24,-16,-20,24,-20],
// 4 16 -20 24 -20 -16 24 -16 16 24 -16 20 24 -20
  [4,16,-20,24,-20,-16,24,-16,16,24,-16,20,24,-20],
// 4 16 20 24 -20 16 24 -16 16 24 16 20 24 20
  [4,16,20,24,-20,16,24,-16,16,24,16,20,24,20],
// 2 24 20 24 20 -20 24 20
  [2,24,20,24,20,-20,24,20],
// 2 24 20 24 -20 -20 24 -20
  [2,24,20,24,-20,-20,24,-20],
// 1 16 0 24 0 0 0 20 0 -24 0 -20 0 0 box3u2p.dat
  [1,16,0,24,0,0,0,20,0,-24,0,-20,0,0, ldraw_lib__box3u2p()],
// 1 16 0 0 0 1 0 0 0 1 0 0 0 1 stug-2x2.dat
  [1,16,0,0,0,1,0,0,0,1,0,0,0,1, ldraw_lib__stug_2x2()],
];
module ldraw_lib__s__3003s02(step=0, col=false, unit=2/5, alt=false, line=0.2, solid=!$preview)
    makepoly(ldraw_lib__s__3003s02(), step=step, col=col, unit=unit, alt=alt, line=line, solid=solid);
ldraw_lib__s__3003s02(line=0.2);
// file: s/3003s01.scad
use <../../lib.scad>
use <3003s02.scad>
function ldraw_lib__s__3003s01() = [
// 0 ~Brick  2 x  2 without Front Face
// 0 Name: s\3003s01.dat
// 0 Author: Steffen [Steffen]
// 0 !LDRAW_ORG Subpart UPDATE 2013-02
// 0 !LICENSE Licensed under CC BY 4.0 : see CAreadme.txt
// 
// 0 BFC CERTIFY CCW
  [0,"BFC","CERTIFY"],
  [0,"BFC","CCW"],
// 
// 0 !HISTORY 2009-05-02 [PTadmin] Official Update 2009-01
// 0 !HISTORY 2013-04-02 [Steffen] used s\3003s02.dat
// 0 !HISTORY 2013-12-23 [PTadmin] Official Update 2013-02
// 
// 
// 1 16 0 0 0 1 0 0 0 1 0 0 0 1 s\3003s02.dat
  [1,16,0,0,0,1,0,0,0,1,0,0,0,1, ldraw_lib__s__3003s02()],
// 4 16 20 24 20 -20 24 20 -20 0 20 20 0 20
  [4,16,20,24,20,-20,24,20,-20,0,20,20,0,20],
];
module ldraw_lib__s__3003s01(step=0, col=false, unit=2/5, alt=false, line=0.2, solid=!$preview)
    makepoly(ldraw_lib__s__3003s01(), step=step, col=col, unit=unit, alt=alt, line=line, solid=solid);
ldraw_lib__s__3003s01(line=0.2);
// file: 3003.scad
use <../lib.scad>
use <s/3003s01.scad>
$fa=1; $fs=0.2;
function ldraw_lib__3003(realsolid=false) = [
// 0 Brick  2 x  2
// 0 Name: 3003.dat
// 0 Author: James Jessiman
// 0 !LDRAW_ORG Part UPDATE 2022-05
// 0 !LICENSE Licensed under CC BY 2.0 and CC BY 4.0 : see CAreadme.txt
// 
// 0 BFC CERTIFY CCW
  [0,"BFC","CERTIFY"],
  [0,"BFC","CCW"],
// 
// 0 !HISTORY 2001-10-26 [PTadmin] Official Update 2001-01
// 0 !HISTORY 2002-05-07 {unknown} BFC Certification
// 0 !HISTORY 2002-06-11 [PTadmin] Official Update 2002-03
// 0 !HISTORY 2007-05-07 [PTadmin] Header formatted for Contributor Agreement
// 0 !HISTORY 2008-07-01 [PTadmin] Official Update 2008-01
// 0 !HISTORY 2022-08-04 [MagFors] Using subfile
// 0 !HISTORY 2022-09-15 [PTadmin] Official Update 2022-05
// 
// 
// 1 16 0 0 0 1 0 0 0 1 0 0 0 1 s\3003s01.dat
  [1,16,0,0,0,1,0,0,0,1,0,0,0,1, ldraw_lib__s__3003s01(realsolid)],
// 4 16 -20 24 -20 20 24 -20 20 0 -20 -20 0 -20
  [4,16,-20,24,-20,20,24,-20,20,0,-20,-20,0,-20],
];
module ldraw_lib__3003(step=0, col=false, unit=2/5, alt=false, line=0.2, solid=!$preview)
    makepoly(ldraw_lib__3003(solid), step=step, col=col, unit=unit, alt=alt, line=line, solid=solid);
ldraw_lib__3003(line=0.2);
// main file
use <../lib.scad>
use <3003.scad>
function ldraw_lib__35275() = [
// 0 =Brick  2 x  2
// 0 Name: 35275.dat
// 0 Author: Massimo Maso [Sirio]
// 0 !LDRAW_ORG Part Alias UPDATE 2025-05
// 0 !LICENSE Licensed under CC BY 4.0 : see CAreadme.txt
// 
// 0 BFC CERTIFY CCW
  [0,"BFC","CERTIFY"],
  [0,"BFC","CCW"],
// 
// 0 !KEYWORDS BrickLink 3003, Rebrickable 3003
// 
// 0 !HISTORY 2025-05-28 [OrionP] Official Update 2025-05
// 
// 1 16 0 0 0 1 0 0 0 1 0 0 0 1 3003.dat
  [1,16,0,0,0,1,0,0,0,1,0,0,0,1, ldraw_lib__3003()],
];
module ldraw_lib__35275(step=0, col=false, unit=2/5, alt=false, line=0.2, solid=!$preview)
    makepoly(ldraw_lib__35275(), step=step, col=col, unit=unit, alt=alt, line=line, solid=solid);
ldraw_lib__35275(line=0.2);
